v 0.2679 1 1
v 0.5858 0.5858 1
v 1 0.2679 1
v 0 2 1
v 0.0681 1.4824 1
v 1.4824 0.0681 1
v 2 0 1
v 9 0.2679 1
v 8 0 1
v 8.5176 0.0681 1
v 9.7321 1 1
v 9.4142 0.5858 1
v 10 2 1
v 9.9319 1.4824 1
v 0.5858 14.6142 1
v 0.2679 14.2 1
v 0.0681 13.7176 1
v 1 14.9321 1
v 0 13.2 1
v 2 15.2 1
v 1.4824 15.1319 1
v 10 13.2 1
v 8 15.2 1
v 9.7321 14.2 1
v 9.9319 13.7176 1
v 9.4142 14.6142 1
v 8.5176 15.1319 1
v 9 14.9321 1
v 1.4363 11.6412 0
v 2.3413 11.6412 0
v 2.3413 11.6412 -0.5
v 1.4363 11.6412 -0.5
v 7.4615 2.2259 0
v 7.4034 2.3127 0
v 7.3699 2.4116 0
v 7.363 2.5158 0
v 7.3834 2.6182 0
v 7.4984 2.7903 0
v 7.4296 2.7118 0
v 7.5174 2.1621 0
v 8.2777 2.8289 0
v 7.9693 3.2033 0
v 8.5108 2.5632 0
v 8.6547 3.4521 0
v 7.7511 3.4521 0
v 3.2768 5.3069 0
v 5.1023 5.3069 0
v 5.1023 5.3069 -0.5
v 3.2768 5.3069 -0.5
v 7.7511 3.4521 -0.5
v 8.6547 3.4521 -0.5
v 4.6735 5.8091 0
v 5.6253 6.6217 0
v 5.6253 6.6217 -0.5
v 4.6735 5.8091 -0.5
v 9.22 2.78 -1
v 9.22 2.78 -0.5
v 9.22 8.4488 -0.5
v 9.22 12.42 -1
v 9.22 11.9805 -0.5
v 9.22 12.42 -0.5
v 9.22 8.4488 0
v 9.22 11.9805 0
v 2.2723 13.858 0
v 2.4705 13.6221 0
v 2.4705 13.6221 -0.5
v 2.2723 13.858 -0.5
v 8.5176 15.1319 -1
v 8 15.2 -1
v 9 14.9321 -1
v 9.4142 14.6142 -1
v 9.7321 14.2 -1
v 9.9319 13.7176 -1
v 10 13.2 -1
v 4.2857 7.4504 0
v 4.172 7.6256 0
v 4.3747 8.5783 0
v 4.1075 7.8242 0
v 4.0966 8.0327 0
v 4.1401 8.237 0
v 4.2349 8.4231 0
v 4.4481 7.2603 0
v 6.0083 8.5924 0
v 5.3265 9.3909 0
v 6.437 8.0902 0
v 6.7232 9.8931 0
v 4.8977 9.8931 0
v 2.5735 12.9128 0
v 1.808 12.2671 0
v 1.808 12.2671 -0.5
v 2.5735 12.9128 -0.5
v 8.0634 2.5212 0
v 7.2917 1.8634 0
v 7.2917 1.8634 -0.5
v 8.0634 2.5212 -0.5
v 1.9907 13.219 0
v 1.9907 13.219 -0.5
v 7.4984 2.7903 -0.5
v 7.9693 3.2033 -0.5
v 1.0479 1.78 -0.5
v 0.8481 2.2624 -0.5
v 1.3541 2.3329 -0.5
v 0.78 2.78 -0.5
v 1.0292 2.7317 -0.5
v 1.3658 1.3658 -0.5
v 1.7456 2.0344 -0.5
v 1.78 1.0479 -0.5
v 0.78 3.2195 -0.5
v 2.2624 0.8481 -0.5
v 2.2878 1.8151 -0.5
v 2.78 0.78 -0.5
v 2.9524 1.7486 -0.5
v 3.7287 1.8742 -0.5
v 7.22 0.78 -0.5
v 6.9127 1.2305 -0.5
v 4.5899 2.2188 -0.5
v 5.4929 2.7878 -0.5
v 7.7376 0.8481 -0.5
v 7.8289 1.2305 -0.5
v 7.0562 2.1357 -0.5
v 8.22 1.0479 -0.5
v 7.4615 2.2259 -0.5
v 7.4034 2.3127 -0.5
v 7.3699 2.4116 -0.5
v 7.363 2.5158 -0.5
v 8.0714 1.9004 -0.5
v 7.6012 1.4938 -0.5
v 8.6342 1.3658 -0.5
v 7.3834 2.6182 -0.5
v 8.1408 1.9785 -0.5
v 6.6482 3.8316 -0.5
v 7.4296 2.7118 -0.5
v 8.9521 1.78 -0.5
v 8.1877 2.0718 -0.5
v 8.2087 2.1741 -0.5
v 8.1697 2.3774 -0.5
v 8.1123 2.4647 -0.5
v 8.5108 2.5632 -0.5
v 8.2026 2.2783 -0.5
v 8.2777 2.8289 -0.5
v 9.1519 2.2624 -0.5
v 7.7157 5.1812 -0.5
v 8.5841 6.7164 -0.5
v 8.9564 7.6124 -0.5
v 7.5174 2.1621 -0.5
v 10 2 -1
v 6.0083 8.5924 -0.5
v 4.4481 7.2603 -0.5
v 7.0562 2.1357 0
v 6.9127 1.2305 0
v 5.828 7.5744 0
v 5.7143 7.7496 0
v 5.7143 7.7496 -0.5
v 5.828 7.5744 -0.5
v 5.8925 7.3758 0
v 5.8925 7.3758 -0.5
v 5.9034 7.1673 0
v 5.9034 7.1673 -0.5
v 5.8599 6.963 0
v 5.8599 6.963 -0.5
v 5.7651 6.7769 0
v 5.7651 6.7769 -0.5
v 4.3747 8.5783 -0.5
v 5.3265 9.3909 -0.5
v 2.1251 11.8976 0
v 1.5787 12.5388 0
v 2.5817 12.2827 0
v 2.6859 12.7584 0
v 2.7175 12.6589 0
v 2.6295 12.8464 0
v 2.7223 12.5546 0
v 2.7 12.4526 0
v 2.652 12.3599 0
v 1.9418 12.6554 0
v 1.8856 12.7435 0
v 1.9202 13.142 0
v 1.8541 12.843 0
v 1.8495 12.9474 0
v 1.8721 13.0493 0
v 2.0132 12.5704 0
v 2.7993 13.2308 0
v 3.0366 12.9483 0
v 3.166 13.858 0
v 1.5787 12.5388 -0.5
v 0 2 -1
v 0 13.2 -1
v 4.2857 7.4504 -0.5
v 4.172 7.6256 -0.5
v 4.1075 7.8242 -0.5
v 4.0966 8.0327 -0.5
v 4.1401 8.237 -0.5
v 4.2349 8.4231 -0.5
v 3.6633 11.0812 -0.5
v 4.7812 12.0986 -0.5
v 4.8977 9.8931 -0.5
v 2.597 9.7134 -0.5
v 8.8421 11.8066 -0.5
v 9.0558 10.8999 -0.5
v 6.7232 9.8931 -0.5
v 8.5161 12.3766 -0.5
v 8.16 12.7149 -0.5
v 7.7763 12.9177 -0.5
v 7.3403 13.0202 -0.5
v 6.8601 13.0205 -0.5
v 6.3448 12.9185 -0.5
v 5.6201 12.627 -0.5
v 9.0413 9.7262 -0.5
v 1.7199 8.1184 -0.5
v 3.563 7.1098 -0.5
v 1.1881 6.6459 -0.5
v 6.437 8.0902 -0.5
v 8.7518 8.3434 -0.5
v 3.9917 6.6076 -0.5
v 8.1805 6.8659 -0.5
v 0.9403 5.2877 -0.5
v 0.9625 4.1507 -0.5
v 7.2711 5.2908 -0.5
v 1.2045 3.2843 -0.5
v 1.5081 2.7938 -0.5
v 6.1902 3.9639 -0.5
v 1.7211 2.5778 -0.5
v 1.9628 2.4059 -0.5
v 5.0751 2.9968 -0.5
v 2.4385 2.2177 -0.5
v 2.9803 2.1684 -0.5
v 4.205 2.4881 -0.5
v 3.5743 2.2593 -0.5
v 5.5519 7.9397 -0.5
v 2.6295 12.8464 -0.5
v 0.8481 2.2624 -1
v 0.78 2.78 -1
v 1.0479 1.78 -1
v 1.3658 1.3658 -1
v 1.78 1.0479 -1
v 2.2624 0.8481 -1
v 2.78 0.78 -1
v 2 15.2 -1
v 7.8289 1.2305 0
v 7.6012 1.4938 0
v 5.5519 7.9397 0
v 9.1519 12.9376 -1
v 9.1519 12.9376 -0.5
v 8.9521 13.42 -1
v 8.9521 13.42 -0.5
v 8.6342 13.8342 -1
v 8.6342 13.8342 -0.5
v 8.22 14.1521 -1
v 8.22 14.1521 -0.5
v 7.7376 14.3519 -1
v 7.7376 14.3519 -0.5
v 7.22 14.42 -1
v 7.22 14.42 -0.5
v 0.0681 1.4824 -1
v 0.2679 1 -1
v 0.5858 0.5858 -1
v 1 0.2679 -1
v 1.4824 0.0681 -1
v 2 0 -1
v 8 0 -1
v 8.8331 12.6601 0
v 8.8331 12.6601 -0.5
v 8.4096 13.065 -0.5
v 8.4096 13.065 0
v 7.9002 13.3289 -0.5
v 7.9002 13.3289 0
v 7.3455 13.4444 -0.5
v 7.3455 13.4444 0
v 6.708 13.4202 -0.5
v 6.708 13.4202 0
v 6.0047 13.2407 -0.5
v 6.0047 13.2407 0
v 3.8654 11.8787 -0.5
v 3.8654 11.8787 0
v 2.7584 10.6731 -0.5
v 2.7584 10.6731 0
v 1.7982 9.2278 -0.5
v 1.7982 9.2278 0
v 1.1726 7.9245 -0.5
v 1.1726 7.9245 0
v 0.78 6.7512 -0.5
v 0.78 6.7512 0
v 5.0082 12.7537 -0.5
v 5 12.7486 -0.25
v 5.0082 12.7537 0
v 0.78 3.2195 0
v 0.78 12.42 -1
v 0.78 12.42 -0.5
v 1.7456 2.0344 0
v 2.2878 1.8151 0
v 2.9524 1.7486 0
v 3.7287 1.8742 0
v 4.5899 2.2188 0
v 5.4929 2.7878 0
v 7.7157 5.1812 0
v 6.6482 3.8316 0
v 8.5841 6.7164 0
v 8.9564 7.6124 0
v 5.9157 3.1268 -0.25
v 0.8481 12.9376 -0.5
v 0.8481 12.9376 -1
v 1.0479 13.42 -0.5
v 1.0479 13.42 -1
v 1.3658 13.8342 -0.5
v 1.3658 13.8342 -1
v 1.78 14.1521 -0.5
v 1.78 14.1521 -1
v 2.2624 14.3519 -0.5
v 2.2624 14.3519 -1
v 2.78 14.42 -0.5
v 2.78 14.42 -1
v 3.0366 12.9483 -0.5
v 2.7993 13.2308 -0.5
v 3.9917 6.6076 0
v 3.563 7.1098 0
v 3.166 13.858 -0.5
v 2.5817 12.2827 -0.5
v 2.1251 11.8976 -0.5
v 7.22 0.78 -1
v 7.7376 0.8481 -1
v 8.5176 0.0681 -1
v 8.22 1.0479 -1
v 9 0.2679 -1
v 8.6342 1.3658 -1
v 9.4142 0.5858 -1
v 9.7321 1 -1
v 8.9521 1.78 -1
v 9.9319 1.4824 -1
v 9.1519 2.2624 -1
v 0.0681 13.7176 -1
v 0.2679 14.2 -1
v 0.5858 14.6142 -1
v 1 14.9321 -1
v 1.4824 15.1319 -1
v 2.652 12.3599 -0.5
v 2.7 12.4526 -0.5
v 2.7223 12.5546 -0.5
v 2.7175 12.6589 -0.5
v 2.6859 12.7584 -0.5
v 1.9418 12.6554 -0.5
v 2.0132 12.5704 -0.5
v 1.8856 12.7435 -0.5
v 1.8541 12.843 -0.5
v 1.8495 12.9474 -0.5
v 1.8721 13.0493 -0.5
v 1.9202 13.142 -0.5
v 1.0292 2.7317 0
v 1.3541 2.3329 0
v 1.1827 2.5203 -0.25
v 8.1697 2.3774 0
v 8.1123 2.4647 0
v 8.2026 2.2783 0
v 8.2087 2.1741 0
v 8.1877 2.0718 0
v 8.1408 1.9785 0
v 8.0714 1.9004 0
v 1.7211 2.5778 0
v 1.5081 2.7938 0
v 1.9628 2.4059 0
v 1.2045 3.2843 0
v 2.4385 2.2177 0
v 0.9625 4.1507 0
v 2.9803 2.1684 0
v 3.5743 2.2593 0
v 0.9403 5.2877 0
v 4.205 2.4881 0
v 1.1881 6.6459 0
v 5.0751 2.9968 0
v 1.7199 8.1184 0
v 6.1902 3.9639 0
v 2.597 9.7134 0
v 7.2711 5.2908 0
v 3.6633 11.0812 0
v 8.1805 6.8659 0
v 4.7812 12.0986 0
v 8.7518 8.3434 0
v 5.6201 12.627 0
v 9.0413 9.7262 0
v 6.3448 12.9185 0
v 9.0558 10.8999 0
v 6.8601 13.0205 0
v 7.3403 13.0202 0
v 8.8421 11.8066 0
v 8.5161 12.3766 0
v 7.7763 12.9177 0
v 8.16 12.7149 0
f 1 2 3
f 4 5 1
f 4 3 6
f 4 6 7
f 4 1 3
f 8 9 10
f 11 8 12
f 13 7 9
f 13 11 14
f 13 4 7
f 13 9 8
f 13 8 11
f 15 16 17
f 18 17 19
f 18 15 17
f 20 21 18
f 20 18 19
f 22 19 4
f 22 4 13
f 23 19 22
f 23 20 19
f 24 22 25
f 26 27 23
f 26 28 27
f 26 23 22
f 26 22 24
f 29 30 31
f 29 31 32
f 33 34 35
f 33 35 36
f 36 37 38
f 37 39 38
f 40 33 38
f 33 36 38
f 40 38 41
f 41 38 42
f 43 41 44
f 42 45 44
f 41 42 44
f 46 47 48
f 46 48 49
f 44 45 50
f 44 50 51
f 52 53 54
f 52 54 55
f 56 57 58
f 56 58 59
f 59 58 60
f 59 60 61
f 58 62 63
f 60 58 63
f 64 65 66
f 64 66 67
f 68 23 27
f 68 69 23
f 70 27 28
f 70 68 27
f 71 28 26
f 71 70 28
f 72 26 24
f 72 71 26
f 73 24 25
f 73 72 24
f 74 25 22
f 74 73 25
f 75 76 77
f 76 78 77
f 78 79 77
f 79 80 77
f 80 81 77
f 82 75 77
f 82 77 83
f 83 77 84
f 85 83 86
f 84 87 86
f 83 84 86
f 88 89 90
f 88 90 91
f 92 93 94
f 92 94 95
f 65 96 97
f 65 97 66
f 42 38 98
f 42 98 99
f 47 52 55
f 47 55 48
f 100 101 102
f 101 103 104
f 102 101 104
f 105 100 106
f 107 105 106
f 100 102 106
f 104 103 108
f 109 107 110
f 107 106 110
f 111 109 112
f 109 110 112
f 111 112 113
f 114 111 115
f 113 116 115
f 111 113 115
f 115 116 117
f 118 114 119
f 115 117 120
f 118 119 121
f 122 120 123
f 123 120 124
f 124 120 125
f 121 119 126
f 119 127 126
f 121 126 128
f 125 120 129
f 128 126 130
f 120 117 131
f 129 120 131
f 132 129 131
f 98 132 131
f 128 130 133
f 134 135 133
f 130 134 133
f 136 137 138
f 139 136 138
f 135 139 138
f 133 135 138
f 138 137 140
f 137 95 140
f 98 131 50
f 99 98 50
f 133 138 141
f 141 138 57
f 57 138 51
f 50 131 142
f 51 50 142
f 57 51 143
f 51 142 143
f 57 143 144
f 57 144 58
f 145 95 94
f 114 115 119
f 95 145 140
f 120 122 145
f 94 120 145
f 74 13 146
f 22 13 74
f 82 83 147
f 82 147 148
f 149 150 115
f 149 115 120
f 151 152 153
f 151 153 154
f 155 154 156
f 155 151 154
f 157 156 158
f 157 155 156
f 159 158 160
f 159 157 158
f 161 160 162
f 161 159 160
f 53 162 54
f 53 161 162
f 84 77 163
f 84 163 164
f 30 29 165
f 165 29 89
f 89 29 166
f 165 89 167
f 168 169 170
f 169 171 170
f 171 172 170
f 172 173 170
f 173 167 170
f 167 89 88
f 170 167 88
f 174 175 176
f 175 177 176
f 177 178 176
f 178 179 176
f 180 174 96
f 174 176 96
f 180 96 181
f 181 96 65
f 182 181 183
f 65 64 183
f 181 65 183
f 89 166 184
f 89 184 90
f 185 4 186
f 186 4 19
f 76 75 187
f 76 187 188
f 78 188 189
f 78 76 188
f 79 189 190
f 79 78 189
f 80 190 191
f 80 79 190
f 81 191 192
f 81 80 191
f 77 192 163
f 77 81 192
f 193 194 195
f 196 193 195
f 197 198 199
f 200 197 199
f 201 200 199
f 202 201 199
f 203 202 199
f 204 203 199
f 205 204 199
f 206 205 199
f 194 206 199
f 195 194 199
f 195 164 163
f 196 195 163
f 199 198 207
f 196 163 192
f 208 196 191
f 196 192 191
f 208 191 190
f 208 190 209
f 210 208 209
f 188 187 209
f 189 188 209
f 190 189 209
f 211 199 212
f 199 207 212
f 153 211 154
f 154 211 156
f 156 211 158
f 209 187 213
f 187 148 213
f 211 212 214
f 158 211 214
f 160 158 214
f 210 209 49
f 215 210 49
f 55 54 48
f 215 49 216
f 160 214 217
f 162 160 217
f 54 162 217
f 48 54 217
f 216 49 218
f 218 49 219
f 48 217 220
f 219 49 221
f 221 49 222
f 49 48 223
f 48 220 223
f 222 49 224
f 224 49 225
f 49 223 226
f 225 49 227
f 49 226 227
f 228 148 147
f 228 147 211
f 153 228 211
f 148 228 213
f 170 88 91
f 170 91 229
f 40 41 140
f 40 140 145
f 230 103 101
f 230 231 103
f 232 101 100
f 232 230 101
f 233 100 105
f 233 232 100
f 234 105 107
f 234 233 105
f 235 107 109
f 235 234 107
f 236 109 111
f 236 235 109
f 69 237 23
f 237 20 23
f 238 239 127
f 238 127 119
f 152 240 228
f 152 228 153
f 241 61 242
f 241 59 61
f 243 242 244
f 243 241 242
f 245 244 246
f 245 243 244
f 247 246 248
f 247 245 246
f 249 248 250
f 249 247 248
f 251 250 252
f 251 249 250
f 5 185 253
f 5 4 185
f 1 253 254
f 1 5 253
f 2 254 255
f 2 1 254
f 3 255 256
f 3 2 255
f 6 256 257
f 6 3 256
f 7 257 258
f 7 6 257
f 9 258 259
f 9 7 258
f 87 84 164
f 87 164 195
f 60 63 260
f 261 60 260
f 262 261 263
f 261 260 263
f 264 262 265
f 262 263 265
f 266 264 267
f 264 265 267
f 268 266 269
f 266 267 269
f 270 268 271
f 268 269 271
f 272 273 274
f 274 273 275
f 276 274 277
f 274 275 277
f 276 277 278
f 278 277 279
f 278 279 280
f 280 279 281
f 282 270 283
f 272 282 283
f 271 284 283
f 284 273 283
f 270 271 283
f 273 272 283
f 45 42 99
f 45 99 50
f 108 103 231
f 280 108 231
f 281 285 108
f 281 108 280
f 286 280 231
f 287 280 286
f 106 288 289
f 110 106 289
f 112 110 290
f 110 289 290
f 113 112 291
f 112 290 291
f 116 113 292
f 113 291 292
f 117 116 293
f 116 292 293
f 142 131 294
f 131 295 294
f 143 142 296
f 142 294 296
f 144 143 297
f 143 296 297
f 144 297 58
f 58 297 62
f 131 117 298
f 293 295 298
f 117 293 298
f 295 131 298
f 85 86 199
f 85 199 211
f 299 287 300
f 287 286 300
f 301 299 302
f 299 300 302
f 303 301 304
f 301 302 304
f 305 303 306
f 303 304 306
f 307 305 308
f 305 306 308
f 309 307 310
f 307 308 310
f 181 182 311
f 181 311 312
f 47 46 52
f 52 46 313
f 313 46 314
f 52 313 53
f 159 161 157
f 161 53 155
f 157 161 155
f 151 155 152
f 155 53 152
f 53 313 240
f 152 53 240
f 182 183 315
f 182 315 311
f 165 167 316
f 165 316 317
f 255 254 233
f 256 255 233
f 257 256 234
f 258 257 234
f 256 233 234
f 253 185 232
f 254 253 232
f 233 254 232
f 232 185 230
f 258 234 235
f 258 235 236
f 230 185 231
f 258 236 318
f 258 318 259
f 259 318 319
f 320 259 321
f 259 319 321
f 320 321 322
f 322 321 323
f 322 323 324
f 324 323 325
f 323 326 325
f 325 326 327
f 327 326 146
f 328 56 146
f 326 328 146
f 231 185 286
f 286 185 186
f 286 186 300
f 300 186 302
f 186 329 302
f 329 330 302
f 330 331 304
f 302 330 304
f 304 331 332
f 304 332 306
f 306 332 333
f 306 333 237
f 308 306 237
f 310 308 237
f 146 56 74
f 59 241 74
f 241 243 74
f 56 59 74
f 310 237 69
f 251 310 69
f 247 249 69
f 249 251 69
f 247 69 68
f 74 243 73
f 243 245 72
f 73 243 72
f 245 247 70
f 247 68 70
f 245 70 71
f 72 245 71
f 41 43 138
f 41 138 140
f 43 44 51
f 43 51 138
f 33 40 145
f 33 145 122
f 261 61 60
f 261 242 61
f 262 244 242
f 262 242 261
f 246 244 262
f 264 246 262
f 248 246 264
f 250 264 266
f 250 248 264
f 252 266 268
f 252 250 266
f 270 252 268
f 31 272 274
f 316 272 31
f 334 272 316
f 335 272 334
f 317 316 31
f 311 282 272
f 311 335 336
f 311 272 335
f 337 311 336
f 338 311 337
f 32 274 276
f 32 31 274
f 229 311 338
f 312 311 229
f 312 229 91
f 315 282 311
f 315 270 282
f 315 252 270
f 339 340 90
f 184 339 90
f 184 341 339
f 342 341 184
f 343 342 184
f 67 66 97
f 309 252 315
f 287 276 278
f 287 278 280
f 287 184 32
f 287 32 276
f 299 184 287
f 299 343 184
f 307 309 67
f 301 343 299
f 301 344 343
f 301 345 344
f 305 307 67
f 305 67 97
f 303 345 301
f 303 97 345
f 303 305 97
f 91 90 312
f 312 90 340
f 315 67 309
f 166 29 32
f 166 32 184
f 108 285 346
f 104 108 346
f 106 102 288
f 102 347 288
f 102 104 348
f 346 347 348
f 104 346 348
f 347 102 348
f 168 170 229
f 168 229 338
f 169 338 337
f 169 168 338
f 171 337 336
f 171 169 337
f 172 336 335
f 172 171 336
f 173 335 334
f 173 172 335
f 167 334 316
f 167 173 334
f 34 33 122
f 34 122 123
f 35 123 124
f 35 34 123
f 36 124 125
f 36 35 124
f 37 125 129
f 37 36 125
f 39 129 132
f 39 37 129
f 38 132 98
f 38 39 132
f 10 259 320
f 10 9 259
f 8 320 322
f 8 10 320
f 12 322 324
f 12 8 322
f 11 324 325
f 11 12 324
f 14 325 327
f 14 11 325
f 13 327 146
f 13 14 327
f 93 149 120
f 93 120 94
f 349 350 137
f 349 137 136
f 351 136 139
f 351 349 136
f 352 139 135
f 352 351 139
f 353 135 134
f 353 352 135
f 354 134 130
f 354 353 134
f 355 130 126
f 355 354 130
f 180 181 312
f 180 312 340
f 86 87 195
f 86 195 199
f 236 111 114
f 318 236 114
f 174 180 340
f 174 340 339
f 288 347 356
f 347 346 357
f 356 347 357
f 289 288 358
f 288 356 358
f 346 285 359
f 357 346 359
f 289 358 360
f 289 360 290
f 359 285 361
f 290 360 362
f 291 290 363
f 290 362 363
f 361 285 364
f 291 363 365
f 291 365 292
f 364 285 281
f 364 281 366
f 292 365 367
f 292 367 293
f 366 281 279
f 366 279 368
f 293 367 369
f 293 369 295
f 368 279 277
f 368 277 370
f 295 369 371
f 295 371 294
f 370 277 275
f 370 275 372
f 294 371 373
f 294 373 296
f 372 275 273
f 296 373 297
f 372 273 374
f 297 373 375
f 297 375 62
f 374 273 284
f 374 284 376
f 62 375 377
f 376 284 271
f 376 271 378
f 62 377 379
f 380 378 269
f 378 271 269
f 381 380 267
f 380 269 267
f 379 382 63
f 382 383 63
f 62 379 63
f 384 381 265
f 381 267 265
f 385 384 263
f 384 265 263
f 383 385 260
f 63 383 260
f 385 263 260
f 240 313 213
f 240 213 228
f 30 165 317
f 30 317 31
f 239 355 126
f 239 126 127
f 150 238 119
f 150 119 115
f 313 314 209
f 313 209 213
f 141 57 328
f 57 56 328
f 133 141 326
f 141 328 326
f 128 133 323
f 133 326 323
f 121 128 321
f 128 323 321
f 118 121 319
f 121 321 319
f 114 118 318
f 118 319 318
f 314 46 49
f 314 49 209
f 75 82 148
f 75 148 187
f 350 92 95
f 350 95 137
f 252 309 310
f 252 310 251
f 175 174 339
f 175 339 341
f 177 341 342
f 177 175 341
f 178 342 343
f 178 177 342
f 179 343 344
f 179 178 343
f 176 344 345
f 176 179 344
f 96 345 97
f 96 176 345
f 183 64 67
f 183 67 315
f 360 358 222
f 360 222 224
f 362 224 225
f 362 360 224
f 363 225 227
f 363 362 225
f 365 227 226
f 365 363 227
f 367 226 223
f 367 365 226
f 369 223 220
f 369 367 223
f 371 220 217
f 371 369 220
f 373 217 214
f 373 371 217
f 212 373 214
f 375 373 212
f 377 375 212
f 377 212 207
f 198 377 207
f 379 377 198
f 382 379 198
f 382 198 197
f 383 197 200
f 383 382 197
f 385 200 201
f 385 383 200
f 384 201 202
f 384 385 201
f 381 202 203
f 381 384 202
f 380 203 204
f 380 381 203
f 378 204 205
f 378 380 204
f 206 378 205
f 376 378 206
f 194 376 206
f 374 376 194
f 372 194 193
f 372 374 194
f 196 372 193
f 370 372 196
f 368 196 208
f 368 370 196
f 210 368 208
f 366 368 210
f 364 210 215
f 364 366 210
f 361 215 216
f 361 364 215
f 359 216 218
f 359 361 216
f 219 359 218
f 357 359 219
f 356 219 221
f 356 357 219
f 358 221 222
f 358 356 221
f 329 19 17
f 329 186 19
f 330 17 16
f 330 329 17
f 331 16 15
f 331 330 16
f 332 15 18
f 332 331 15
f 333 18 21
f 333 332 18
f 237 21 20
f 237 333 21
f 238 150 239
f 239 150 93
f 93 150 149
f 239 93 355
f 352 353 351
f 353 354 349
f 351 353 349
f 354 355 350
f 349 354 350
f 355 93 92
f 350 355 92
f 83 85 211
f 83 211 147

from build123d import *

# Parameters (mm, degrees)
SKETCH1_W           = 10
SKETCH1_H           = 15.2
BOSS_EXTRUDE1_DEPTH = 1
SKETCH1_8_W         = 10
SKETCH1_8_H         = 15.2
SKETCH1_8_W_2       = 8.44
SKETCH1_8_H_2       = 13.64
BOSS_EXTRUDE2_DEPTH = 1
SKETCH1_9_RX        = 6.016925947
SKETCH1_9_RY        = 3.157568793
BOSS_EXTRUDE3_DEPTH = 0.5
FILLET1_R           = 2


with BuildPart() as part:
    # Sketch1 (on Front Plane) → Boss-Extrude1 (new body)
    with BuildSketch(Plane.XY):
        with Locations((5, 7.6)):
            Rectangle(SKETCH1_W, SKETCH1_H)
    extrude(amount=BOSS_EXTRUDE1_DEPTH)

    # Sketch1<8> (on Front Plane) → Boss-Extrude2 (add)
    with BuildSketch(Plane.XY):
        with Locations((5, 7.6)):
            Rectangle(SKETCH1_8_W, SKETCH1_8_H)
        with Locations((5, 7.6)):
            Rectangle(SKETCH1_8_W_2, SKETCH1_8_H_2, mode=Mode.SUBTRACT)
    extrude(amount=-BOSS_EXTRUDE2_DEPTH)

    # Sketch1<9> (on Front Plane) → Boss-Extrude3 (add)
    # profile 1 of 3: a face of its own
    with BuildSketch(Plane.XY):
        with Locations(Location((5, 7.6), (0, 0, -120.316314342))):
            Ellipse(SKETCH1_9_RX, SKETCH1_9_RY)
        with BuildLine():
            Line((5.55192436, 7.939742657), (5.714255538, 7.749614835))
            ThreePointArc((5.714255538, 7.749614835), (5.903370184, 7.16725844), (5.625306277, 6.621746036))
            Line((5.625306277, 6.621746036), (4.673505596, 5.809098397))
            Line((4.673505596, 5.809098397), (5.102260043, 5.306926538))
            Line((5.102260043, 5.306926538), (3.276812461, 5.306926538))
            Line((3.276812461, 5.306926538), (3.562960201, 7.109807107))
            Line((3.562960201, 7.109807107), (3.991714649, 6.607635249))
            Line((3.991714649, 6.607635249), (5.55192436, 7.939742657))
        make_face(mode=Mode.SUBTRACT)
        with BuildLine():
            Line((4.44807564, 7.260257343), (4.285744462, 7.450385165))
            ThreePointArc((4.285744462, 7.450385165), (4.096629816, 8.03274156), (4.374693723, 8.578253964))
            Line((4.374693723, 8.578253964), (5.326494404, 9.390901603))
            Line((5.326494404, 9.390901603), (4.897739957, 9.893073462))
            Line((4.897739957, 9.893073462), (6.723187539, 9.893073462))
            Line((6.723187539, 9.893073462), (6.437039799, 8.090192893))
            Line((6.437039799, 8.090192893), (6.008285351, 8.592364751))
            Line((6.008285351, 8.592364751), (4.44807564, 7.260257343))
        make_face(mode=Mode.SUBTRACT)
    # profile 2 of 3: a face of its own
    with BuildSketch(Plane.XY):
        with BuildLine():
            add(Edge.make_bspline(
                [(9.22, 11.980450807), (5, 22.611600433), (0.78, 6.751239794)],
                knots=[2.731060957, 2.731060957, 2.731060957, 5.172488647, 5.172488647, 5.172488647], degree=2, weights=[1, 0.342975287, 1]))
            Line((9.22, 11.980450807), (9.22, 14.42))
            Line((9.22, 14.42), (0.78, 14.42))
            Line((0.78, 14.42), (0.78, 6.751239794))
        make_face()
        with BuildLine():
            Line((1.807963278, 12.267050426), (2.573541086, 12.912762773))
            Line((2.573541086, 12.912762773), (2.629548837, 12.846358141))
            ThreePointArc((2.629548837, 12.846358141), (2.72234926, 12.554615255), (2.581675695, 12.282702073))
            Line((2.581675695, 12.282702073), (2.125075804, 11.897591397))
            Line((2.125075804, 11.897591397), (2.341285421, 11.641246159))
            Line((2.341285421, 11.641246159), (1.436292724, 11.641246159))
            Line((1.436292724, 11.641246159), (1.578739925, 12.538825176))
            Line((1.578739925, 12.538825176), (1.807963278, 12.267050426))
        make_face(mode=Mode.SUBTRACT)
        with BuildLine():
            Line((2.79925212, 13.230809928), (2.013248175, 12.570380578))
            Line((2.013248175, 12.570380578), (1.941775235, 12.655443444))
            ThreePointArc((1.941775235, 12.655443444), (1.849520441, 12.947359327), (1.99070215, 13.219009018))
            Line((1.99070215, 13.219009018), (2.47045985, 13.622119038))
            Line((2.47045985, 13.622119038), (2.272289715, 13.857969409))
            Line((2.272289715, 13.857969409), (3.166035288, 13.857969409))
            Line((3.166035288, 13.857969409), (3.036644718, 12.948279301))
            Line((3.036644718, 12.948279301), (2.79925212, 13.230809928))
        make_face(mode=Mode.SUBTRACT)
    # profile 3 of 3: a face of its own
    with BuildSketch(Plane.XY):
        with BuildLine():
            Line((0.78, 0.78), (9.22, 0.78))
            Line((9.22, 0.78), (9.22, 8.448760206))
            add(Edge.make_bspline(
                [(1.745579435, 2.034365319), (6.736770522, -0.884158057), (9.22, 8.448760206)],
                knots=[0, 0, 0, 2.030895994, 2.030895994, 2.030895994], degree=2, weights=[1, 0.527239314, 1]))
            add(Edge.make_bspline(
                [(0.78, 3.219549193), (1.100794809, 2.411393361), (1.745579435, 2.034365319)],
                knots=[5.872653611, 5.872653611, 5.872653611, 6.283185307, 6.283185307, 6.283185307], degree=2, weights=[1, 0.979006832, 1]))
            Line((0.78, 3.219549193), (0.78, 0.78))
        make_face()
        with BuildLine():
            Line((7.056197058, 2.135669885), (7.291696407, 1.863373763))
            Line((7.291696407, 1.863373763), (8.063431346, 2.521185925))
            Line((8.063431346, 2.521185925), (8.112322941, 2.464655019))
            ThreePointArc((8.112322941, 2.464655019), (8.208731591, 2.174084541), (8.071438446, 1.900448977))
            Line((8.071438446, 1.900448977), (7.601212367, 1.493766963))
            Line((7.601212367, 1.493766963), (7.828929297, 1.230469263))
            Line((7.828929297, 1.230469263), (6.912689643, 1.230469263))
            Line((6.912689643, 1.230469263), (7.056197058, 2.135669885))
        make_face(mode=Mode.SUBTRACT)
        with BuildLine():
            Line((8.277665846, 2.828924058), (7.517372897, 2.16210975))
            Line((7.517372897, 2.16210975), (7.461453822, 2.225867947))
            ThreePointArc((7.461453822, 2.225867947), (7.36303426, 2.515763479), (7.498428218, 2.790343716))
            Line((7.498428218, 2.790343716), (7.969285134, 3.203308389))
            Line((7.969285134, 3.203308389), (7.7510695, 3.452115))
            Line((7.7510695, 3.452115), (8.654696366, 3.452115))
            Line((8.654696366, 3.452115), (8.51075838, 2.563155))
            Line((8.51075838, 2.563155), (8.277665846, 2.828924058))
        make_face(mode=Mode.SUBTRACT)
    extrude(amount=-BOSS_EXTRUDE3_DEPTH)

    # Fillet1
    fillet1_edges = [part.edges().sort_by_distance(p)[0] for p in [
        (0.78, 0.78, -0.75),
        (0.78, 14.42, -0.75),
        (9.22, 14.42, -0.75),
        (9.22, 0.78, -0.75),
        (0, 15.2, 0),
        (0, 0, 0),
        (10, 0, 0),
        (10, 15.2, 0),
    ]]
    fillet(fillet1_edges, radius=FILLET1_R)


solid = part.part
